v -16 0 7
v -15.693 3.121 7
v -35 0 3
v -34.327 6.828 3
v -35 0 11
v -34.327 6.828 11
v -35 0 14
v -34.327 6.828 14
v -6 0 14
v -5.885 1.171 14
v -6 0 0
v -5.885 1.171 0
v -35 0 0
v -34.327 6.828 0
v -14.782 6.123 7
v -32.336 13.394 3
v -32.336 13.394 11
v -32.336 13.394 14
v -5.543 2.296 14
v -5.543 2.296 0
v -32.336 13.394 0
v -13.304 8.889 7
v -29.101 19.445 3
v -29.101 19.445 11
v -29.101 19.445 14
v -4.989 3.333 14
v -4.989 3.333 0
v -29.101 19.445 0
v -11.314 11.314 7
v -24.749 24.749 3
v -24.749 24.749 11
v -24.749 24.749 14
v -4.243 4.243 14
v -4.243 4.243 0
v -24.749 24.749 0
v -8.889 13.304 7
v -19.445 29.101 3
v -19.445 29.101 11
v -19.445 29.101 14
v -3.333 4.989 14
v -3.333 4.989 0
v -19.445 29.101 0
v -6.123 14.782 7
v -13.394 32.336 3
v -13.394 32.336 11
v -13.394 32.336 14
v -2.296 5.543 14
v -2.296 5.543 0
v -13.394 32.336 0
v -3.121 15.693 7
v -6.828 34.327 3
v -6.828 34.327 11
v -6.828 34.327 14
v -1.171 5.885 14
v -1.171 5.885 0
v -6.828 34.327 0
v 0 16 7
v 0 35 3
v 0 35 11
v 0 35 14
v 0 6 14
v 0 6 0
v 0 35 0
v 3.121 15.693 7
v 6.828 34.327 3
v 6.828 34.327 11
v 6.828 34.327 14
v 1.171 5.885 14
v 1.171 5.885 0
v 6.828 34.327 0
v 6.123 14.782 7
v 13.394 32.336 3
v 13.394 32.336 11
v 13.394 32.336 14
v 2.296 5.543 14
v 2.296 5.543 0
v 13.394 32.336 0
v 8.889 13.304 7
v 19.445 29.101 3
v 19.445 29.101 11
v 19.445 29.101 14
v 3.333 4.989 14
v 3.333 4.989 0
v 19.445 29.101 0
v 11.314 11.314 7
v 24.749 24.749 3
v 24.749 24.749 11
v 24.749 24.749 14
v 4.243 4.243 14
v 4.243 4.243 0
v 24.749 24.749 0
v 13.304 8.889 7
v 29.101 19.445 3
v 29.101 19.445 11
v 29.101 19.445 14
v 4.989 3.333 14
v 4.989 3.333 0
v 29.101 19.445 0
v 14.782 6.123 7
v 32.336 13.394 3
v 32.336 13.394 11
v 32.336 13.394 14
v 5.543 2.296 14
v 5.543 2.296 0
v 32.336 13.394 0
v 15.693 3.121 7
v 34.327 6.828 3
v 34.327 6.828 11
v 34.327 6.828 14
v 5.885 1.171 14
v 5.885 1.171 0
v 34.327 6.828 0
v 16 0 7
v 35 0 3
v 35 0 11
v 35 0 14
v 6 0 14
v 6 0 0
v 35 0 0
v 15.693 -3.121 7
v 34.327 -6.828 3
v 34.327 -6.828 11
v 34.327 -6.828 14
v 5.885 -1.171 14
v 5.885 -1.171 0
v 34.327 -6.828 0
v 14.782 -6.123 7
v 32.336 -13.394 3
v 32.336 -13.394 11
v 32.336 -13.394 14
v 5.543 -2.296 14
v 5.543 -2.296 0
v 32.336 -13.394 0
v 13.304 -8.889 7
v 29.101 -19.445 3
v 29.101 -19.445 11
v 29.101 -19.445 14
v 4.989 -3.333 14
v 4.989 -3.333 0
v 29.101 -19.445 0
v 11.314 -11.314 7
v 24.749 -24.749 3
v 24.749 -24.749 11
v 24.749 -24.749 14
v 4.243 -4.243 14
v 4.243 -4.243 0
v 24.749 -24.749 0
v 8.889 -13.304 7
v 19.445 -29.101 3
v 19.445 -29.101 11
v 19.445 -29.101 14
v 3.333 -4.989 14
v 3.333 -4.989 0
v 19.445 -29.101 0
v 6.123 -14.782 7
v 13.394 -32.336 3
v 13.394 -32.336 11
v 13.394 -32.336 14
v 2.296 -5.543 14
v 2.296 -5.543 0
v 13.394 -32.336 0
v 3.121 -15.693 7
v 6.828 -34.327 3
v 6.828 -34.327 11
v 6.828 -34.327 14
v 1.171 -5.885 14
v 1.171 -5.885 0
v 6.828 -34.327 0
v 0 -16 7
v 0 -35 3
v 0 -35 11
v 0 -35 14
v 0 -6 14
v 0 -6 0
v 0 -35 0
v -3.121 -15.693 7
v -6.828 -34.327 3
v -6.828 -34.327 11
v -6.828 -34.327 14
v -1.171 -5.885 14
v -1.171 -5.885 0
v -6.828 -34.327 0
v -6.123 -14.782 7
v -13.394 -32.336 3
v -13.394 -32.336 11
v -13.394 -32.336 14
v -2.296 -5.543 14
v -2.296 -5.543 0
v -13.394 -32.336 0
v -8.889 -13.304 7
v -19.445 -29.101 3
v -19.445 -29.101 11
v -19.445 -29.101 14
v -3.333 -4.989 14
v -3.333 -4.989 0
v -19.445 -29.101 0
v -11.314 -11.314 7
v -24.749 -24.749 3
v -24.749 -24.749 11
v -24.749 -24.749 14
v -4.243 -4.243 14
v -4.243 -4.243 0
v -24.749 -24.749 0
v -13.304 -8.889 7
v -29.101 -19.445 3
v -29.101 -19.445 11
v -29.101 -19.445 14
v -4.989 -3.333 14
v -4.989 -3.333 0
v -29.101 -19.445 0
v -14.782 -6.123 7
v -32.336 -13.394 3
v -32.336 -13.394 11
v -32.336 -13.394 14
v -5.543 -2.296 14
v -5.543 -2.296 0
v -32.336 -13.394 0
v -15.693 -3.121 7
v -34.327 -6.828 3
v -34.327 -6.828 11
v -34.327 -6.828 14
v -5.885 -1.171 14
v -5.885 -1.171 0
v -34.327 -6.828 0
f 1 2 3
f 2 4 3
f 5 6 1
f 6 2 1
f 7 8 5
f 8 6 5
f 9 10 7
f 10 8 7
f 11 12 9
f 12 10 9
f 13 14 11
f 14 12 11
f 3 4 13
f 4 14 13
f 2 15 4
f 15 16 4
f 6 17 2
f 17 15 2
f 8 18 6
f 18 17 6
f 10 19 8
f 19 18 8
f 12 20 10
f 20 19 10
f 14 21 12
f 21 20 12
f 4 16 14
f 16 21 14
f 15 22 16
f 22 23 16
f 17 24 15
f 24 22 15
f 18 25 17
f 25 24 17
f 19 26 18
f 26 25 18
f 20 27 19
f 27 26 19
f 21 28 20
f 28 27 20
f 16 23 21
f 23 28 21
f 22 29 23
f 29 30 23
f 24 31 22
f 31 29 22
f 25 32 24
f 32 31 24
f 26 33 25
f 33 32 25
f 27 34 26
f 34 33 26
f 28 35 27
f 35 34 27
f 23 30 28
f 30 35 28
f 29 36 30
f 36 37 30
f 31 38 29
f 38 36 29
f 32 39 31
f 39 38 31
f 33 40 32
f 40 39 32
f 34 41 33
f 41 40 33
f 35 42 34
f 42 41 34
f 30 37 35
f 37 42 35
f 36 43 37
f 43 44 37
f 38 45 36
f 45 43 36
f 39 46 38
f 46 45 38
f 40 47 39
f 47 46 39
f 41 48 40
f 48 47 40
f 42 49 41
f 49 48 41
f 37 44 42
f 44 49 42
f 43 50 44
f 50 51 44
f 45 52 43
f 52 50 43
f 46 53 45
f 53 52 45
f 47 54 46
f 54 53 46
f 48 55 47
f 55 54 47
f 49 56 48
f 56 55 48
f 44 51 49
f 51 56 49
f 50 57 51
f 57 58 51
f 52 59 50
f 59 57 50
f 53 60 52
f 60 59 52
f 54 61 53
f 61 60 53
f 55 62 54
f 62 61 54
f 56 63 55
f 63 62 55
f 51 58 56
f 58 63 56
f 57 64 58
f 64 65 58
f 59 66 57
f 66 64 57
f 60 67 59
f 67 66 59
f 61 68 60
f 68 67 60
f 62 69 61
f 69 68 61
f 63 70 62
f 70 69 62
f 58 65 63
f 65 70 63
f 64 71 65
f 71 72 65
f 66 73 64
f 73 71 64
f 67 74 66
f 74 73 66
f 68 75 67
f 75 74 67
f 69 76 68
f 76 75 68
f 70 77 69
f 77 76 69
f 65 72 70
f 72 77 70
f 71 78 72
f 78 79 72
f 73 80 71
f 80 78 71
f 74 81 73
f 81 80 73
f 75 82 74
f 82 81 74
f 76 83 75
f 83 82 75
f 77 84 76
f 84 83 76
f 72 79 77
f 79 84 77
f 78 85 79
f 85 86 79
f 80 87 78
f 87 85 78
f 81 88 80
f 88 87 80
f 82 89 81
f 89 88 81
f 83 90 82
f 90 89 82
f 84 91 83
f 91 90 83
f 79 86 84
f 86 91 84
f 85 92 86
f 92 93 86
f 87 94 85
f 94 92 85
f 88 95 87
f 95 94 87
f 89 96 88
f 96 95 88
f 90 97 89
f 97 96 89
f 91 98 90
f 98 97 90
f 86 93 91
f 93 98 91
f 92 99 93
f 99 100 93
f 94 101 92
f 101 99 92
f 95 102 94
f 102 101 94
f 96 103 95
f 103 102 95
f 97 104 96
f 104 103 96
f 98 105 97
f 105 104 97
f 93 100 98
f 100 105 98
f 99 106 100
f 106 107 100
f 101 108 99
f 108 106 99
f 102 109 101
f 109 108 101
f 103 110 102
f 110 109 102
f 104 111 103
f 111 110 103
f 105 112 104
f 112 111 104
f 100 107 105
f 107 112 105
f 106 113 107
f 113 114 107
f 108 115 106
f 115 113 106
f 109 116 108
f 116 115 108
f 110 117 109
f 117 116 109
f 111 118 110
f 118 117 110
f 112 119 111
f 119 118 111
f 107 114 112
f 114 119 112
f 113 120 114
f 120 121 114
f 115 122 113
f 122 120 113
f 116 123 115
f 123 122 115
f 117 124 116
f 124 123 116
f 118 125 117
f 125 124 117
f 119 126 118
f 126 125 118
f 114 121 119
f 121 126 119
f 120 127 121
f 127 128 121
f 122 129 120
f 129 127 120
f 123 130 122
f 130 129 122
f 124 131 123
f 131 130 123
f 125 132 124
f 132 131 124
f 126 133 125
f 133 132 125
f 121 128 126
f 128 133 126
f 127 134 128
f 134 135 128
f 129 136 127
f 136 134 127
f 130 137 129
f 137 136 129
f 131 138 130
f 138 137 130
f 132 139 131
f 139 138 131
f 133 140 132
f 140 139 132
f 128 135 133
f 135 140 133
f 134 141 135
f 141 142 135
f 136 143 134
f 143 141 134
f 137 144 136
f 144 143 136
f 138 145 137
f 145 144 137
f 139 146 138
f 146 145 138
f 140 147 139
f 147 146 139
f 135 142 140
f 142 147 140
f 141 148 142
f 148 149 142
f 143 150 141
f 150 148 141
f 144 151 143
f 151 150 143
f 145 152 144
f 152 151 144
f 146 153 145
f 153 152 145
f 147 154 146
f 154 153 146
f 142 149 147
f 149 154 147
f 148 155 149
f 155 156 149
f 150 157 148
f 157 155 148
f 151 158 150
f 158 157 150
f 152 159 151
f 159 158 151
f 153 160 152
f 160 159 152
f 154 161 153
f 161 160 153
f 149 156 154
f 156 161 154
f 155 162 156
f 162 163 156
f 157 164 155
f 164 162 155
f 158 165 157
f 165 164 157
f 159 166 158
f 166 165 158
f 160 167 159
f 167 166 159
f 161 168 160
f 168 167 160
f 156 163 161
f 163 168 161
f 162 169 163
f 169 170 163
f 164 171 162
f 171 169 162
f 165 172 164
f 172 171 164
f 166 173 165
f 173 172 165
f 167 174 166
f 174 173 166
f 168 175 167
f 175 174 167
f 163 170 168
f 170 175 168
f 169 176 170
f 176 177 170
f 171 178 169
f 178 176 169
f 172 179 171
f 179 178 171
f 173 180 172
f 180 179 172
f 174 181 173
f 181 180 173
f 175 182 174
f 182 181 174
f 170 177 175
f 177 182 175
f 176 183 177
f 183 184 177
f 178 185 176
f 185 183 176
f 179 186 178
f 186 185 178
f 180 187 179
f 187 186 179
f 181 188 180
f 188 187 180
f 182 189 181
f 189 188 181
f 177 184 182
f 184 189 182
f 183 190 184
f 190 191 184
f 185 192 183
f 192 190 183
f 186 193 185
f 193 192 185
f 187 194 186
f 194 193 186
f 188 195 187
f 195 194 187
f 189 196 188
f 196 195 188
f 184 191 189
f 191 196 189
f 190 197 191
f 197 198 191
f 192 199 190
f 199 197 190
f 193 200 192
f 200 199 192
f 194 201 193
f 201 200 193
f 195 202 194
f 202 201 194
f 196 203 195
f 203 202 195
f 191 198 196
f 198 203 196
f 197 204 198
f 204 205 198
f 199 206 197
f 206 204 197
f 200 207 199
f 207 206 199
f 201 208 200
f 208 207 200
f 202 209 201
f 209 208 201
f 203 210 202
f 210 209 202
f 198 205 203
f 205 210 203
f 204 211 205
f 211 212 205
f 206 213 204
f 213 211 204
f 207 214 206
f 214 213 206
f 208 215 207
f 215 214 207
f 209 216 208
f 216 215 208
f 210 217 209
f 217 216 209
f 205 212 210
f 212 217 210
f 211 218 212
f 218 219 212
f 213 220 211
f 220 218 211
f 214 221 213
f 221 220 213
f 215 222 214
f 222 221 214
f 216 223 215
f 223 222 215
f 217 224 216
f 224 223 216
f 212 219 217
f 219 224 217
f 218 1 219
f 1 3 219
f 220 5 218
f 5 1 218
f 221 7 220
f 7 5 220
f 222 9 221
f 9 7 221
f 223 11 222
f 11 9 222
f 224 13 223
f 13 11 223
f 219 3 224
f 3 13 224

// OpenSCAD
$fn = 32;

// ----------------------------------------------------------------------
// Revolved part: V-groove pulley R35
// ----------------------------------------------------------------------

// --- parameters (mm) ---
bore_r = 6;               // bore radius
rim_r = 35;               // rim radius
rim_t = 14;               // rim width
groove_r = 16;            // groove root radius
groove_w = 4;             // groove half width
revolve_angle = 360;      // revolve sweep, degrees
fit_tol = 0.05;           // declared fit tolerance (prompt contract)
free_tol = 0.3;           // declared free tolerance (prompt contract)

bore_d = 2 * bore_r;
rim_d = 2 * rim_r;
groove_d = 2 * groove_r;

profile = [[6, 0], [35, 0], [35, 3], [16, 7], [35, 11], [35, 14], [6, 14]];  // primary outline, 7 points, counter clockwise

// --- the one profile operation ---
rotate_extrude(angle = revolve_angle) polygon(points = profile);
